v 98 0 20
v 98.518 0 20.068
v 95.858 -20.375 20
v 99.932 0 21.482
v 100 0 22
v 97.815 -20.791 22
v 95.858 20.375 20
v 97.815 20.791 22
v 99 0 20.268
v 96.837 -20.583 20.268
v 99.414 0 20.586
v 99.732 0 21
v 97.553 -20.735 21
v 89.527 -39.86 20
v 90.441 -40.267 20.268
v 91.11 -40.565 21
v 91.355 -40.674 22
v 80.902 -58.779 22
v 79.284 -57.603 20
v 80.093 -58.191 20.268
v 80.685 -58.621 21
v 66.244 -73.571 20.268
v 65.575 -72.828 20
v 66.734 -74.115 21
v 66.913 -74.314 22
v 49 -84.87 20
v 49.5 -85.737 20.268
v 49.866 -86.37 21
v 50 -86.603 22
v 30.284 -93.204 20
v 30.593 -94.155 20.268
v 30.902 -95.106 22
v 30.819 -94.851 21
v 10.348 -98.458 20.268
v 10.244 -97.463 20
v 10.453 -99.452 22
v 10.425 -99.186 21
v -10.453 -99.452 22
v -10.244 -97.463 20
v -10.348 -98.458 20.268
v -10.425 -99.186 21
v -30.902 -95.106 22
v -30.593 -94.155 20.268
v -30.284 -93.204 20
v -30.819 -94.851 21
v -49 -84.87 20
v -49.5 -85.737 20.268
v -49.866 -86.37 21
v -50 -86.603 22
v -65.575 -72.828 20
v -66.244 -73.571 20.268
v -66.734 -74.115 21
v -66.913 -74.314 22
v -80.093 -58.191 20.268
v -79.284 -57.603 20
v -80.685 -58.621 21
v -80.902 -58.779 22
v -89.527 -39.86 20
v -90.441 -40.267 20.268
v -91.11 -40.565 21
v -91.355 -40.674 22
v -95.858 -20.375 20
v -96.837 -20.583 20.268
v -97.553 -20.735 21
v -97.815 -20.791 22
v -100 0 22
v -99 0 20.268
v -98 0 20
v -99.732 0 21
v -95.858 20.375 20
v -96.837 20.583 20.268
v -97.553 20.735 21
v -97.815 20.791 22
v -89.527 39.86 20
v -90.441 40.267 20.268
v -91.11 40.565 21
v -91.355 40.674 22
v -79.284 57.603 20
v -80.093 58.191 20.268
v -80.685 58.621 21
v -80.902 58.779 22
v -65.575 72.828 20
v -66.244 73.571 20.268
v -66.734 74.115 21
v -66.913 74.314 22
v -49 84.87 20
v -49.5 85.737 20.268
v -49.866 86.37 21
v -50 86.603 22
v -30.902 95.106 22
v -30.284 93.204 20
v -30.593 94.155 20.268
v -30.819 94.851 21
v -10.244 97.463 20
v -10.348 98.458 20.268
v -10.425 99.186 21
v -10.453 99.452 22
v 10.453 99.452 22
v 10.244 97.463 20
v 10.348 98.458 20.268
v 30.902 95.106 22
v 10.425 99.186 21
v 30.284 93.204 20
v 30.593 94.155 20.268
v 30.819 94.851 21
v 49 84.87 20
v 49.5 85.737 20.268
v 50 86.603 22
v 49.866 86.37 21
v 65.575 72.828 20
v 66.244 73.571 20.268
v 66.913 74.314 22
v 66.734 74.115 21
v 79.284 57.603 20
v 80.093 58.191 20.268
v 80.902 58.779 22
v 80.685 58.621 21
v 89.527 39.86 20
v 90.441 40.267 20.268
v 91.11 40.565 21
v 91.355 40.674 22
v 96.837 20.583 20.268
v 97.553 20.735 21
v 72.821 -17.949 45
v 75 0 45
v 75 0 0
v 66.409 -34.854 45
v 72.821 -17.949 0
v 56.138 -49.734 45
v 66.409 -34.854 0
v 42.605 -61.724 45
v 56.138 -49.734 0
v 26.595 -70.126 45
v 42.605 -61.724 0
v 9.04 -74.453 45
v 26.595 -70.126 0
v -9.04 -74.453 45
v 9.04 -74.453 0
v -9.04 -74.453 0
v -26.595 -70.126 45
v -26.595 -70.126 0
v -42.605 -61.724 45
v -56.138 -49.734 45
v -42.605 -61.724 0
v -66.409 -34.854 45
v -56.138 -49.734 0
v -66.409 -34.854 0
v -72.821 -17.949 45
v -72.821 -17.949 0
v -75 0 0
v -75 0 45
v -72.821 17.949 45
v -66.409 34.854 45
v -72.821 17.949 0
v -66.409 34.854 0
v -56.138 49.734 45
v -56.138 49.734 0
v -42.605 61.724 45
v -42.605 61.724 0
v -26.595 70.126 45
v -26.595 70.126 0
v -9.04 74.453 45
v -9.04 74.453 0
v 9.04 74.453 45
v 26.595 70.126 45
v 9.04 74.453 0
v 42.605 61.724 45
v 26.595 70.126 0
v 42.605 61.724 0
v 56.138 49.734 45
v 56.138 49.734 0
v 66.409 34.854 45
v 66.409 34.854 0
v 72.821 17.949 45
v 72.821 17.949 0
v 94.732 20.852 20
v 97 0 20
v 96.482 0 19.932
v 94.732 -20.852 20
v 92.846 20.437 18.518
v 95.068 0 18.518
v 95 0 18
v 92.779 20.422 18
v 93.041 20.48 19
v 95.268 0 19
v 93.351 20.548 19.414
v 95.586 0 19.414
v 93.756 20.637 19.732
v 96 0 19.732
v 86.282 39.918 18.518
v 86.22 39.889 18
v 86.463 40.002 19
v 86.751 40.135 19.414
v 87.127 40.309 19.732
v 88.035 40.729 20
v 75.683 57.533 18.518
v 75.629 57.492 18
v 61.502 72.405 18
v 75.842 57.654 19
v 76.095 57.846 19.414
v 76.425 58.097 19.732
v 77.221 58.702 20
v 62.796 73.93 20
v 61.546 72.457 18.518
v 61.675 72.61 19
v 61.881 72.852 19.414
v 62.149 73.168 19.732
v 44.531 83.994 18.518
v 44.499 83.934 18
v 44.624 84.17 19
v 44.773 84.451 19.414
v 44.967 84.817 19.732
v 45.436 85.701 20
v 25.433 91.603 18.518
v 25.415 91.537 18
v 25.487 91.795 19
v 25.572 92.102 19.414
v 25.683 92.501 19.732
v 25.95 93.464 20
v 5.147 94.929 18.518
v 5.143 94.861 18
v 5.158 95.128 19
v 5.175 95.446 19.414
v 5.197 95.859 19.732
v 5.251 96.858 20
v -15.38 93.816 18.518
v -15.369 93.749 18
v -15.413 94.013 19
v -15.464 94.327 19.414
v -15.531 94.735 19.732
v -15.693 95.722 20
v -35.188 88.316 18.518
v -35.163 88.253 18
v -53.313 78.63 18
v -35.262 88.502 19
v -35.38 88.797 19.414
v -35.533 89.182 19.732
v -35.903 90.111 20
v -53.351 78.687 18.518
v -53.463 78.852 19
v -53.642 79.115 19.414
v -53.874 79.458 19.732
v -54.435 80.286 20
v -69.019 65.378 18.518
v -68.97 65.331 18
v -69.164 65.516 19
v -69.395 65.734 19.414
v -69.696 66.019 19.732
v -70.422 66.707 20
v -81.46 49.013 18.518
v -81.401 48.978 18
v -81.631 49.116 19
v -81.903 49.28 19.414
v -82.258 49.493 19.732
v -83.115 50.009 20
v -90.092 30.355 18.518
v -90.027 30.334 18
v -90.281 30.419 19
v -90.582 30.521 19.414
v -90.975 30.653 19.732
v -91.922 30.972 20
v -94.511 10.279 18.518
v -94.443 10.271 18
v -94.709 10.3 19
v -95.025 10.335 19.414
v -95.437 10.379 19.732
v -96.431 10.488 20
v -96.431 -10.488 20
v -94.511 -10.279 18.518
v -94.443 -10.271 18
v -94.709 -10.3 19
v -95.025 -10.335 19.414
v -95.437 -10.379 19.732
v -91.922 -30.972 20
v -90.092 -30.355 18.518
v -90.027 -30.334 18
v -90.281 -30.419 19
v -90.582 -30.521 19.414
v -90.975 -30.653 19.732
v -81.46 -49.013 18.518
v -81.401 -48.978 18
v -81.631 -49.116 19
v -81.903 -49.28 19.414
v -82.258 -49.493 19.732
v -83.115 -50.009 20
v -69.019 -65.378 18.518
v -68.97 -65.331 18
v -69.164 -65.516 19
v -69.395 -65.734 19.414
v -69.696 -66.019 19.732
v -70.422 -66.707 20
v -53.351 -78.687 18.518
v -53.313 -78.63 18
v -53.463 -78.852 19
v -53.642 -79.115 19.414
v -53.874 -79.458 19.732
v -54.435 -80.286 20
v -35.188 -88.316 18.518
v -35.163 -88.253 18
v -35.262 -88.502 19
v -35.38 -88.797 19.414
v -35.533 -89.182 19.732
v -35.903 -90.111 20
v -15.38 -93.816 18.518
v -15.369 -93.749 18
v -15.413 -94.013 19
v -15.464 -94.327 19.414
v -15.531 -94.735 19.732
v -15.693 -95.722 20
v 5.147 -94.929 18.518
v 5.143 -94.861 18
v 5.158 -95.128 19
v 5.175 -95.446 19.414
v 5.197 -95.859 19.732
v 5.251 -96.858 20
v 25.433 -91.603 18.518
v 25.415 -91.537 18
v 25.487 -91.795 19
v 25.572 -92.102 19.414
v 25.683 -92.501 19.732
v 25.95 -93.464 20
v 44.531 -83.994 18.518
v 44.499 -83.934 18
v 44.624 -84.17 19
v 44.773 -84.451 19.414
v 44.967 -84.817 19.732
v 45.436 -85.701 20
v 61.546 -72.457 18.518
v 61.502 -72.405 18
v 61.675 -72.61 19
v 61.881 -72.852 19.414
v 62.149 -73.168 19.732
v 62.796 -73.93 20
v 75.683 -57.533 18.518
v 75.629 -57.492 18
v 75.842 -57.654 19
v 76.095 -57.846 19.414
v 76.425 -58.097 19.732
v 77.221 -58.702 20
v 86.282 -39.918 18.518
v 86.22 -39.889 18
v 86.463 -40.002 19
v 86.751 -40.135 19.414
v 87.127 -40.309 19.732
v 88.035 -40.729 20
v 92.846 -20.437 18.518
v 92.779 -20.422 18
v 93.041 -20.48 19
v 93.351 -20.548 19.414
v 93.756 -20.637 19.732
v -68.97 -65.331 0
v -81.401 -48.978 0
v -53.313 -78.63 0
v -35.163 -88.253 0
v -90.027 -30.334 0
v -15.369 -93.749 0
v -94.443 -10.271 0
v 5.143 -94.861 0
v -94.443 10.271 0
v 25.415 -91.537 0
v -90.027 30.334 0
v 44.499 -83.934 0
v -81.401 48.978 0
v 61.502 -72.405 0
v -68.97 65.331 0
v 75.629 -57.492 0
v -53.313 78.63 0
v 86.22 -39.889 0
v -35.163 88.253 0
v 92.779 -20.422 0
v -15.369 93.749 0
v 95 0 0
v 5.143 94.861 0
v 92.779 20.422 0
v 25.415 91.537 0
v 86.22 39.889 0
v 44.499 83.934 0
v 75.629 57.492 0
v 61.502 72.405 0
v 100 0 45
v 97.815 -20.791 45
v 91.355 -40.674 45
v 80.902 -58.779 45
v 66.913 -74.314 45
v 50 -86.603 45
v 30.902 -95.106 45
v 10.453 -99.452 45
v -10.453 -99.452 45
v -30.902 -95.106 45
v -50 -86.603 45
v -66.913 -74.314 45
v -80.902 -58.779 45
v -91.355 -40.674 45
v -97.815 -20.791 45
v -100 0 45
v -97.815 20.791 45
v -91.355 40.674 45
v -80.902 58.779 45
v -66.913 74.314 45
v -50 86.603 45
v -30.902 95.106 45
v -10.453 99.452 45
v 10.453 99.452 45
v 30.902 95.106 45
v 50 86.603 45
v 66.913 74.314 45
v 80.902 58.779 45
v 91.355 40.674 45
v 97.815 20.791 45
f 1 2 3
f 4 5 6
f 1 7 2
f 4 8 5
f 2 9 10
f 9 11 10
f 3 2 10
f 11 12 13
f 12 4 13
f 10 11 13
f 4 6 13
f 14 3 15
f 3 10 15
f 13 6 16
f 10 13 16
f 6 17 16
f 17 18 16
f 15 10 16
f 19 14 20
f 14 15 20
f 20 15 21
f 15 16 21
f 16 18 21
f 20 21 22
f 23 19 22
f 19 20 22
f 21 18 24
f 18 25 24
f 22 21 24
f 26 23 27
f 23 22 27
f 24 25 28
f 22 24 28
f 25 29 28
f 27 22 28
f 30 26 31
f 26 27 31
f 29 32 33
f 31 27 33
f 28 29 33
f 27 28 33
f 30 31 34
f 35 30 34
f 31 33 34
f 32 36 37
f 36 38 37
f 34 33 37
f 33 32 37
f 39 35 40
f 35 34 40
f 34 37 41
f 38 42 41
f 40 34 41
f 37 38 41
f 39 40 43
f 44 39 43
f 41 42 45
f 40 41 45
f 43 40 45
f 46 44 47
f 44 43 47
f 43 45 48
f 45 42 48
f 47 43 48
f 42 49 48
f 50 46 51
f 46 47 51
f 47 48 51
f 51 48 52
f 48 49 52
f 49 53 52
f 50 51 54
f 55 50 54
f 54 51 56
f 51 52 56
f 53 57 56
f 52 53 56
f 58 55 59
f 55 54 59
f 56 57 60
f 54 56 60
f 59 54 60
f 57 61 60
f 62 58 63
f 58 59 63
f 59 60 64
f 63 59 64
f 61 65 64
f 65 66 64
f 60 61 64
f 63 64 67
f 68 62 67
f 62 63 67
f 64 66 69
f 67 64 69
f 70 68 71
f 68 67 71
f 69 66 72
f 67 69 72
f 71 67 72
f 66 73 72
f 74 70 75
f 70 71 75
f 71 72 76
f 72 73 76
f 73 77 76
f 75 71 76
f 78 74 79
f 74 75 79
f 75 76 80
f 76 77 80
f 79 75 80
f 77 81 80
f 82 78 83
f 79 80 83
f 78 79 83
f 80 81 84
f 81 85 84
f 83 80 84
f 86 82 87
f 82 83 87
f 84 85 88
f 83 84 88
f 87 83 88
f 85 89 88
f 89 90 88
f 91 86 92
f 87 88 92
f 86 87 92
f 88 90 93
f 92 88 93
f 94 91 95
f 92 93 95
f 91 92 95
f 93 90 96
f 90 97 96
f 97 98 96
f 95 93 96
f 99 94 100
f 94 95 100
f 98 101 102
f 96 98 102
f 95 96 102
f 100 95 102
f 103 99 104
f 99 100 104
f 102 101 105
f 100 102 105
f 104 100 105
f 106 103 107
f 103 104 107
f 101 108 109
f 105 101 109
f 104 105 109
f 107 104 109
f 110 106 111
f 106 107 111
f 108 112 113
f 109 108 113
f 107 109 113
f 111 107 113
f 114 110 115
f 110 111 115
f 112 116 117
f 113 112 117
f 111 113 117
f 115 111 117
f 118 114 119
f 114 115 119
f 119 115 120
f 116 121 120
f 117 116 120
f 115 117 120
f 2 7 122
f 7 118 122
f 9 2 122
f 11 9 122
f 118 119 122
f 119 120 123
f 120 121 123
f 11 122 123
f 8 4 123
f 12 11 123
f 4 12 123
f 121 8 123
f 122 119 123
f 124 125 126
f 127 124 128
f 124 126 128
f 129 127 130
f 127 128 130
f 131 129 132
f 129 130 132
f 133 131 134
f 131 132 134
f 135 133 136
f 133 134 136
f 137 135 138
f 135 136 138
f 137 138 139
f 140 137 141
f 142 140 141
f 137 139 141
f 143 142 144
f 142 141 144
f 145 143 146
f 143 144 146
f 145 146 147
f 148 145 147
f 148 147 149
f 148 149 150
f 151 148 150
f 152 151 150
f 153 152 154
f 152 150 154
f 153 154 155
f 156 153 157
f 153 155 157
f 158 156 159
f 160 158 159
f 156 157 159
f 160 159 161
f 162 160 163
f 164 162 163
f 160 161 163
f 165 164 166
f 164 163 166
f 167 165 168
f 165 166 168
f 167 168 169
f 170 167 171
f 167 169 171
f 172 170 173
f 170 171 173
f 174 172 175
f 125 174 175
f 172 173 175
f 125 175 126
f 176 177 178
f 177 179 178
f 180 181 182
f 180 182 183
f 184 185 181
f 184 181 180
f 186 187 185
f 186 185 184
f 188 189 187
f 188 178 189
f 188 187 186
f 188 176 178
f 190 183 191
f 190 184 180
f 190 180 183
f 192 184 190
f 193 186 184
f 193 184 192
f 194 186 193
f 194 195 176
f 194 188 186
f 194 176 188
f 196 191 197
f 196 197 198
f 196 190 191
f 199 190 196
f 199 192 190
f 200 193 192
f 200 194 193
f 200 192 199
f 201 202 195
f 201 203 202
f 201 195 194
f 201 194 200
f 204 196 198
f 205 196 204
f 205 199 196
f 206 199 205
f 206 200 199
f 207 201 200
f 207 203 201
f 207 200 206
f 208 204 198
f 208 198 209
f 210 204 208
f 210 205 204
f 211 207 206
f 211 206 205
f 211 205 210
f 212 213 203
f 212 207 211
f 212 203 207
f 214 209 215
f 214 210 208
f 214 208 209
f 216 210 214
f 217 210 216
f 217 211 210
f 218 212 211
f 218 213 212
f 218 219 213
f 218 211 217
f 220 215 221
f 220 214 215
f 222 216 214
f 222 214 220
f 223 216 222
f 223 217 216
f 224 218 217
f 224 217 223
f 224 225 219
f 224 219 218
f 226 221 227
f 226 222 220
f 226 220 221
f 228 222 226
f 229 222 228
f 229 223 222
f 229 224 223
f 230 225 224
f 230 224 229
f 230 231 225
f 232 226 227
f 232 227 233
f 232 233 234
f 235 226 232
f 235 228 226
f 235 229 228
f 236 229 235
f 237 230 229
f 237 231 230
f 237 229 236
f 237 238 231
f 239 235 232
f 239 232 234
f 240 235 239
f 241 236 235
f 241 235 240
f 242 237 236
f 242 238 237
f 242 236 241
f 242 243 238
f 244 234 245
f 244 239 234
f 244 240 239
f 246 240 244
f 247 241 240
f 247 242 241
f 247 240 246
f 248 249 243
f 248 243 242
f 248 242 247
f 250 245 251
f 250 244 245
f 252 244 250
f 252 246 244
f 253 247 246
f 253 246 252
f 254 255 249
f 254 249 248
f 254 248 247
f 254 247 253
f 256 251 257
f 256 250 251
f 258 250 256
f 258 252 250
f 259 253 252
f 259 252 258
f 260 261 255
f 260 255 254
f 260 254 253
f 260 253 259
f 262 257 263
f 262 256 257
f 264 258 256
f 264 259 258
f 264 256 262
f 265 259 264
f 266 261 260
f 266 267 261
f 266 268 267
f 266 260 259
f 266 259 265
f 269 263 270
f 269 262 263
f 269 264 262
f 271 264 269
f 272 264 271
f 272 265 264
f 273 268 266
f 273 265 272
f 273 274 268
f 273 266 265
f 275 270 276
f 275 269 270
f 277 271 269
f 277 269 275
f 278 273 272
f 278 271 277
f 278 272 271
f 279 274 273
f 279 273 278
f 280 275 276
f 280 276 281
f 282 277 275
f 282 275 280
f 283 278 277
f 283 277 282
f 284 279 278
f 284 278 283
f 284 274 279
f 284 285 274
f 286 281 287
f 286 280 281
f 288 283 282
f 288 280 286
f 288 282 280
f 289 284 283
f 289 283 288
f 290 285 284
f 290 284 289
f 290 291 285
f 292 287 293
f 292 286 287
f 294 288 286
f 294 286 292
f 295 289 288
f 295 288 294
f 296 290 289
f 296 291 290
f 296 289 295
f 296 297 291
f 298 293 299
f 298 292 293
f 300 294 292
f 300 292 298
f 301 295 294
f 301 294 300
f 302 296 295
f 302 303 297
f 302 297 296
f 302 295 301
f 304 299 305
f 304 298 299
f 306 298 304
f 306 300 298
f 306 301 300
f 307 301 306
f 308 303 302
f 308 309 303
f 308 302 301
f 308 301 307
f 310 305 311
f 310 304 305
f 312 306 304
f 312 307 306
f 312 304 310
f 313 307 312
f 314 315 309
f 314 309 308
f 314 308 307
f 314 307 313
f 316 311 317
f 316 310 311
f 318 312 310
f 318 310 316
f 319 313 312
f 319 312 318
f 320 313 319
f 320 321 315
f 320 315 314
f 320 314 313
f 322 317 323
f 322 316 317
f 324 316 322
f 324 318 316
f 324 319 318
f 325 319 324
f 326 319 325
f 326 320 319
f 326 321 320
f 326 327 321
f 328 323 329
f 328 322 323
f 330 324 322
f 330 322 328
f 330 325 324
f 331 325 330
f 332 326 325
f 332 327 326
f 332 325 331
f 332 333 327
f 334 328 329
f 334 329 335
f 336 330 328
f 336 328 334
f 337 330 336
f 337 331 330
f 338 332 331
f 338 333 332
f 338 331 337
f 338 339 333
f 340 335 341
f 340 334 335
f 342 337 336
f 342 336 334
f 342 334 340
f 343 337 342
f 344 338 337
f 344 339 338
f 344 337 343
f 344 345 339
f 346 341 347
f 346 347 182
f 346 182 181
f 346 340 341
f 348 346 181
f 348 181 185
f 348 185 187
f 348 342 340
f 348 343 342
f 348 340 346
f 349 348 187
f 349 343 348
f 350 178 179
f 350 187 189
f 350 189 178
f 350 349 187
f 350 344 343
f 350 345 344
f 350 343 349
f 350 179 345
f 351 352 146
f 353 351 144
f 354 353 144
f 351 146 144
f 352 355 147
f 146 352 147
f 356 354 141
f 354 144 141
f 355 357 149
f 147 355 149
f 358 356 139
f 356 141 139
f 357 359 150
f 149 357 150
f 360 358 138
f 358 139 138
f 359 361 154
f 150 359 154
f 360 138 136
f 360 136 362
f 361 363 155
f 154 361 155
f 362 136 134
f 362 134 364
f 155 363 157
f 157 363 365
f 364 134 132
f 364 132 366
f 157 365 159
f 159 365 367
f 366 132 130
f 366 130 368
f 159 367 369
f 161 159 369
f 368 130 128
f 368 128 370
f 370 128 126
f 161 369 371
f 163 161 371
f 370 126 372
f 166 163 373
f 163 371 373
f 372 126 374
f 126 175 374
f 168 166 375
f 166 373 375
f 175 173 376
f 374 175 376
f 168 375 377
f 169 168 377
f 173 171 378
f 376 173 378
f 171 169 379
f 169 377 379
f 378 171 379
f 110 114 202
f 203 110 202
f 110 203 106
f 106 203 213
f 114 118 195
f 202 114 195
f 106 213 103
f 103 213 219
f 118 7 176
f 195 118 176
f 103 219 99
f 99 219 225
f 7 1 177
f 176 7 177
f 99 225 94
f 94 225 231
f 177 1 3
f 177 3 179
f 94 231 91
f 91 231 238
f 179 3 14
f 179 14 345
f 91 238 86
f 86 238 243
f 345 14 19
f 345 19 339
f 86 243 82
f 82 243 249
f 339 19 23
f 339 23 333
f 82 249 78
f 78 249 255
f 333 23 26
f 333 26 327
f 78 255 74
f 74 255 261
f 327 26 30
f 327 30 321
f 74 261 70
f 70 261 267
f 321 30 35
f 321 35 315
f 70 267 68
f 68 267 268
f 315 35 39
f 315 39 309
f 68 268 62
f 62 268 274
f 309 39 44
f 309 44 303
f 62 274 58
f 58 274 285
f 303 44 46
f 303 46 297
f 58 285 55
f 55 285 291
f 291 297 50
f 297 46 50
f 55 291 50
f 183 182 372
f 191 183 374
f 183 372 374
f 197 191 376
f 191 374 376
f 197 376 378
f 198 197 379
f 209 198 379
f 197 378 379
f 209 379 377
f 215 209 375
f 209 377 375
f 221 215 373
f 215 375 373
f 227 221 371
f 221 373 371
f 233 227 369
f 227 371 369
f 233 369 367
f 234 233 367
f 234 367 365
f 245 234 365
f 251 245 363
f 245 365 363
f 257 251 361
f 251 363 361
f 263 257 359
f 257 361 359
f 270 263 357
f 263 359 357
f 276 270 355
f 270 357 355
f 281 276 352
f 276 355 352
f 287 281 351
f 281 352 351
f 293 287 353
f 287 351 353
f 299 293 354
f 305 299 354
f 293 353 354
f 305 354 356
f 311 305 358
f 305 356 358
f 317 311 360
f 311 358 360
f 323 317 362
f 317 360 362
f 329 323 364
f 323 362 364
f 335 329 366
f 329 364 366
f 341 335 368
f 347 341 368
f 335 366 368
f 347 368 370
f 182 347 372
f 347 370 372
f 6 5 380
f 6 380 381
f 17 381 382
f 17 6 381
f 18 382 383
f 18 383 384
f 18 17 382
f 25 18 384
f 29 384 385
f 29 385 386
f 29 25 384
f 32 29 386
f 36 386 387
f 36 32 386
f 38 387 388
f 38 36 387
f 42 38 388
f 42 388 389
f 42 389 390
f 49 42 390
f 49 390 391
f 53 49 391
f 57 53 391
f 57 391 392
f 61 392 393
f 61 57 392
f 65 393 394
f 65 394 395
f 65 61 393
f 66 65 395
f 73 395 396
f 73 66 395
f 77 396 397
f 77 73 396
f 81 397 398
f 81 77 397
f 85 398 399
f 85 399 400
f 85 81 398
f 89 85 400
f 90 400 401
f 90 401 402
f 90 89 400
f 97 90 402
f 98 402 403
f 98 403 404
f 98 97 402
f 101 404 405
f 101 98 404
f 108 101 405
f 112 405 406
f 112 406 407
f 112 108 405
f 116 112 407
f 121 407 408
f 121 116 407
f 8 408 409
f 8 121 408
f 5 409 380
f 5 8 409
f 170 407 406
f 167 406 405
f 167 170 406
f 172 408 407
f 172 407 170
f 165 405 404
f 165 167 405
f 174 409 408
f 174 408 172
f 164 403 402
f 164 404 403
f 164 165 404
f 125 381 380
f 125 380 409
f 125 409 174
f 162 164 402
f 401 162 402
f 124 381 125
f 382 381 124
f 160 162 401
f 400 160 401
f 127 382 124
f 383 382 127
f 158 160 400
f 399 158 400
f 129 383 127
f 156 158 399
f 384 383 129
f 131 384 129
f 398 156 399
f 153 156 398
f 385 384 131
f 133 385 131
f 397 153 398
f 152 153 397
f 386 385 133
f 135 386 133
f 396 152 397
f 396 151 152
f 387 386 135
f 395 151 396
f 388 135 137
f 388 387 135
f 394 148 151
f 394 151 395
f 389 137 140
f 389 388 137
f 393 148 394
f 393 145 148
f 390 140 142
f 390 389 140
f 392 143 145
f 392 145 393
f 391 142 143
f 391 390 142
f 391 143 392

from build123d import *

# Parameters (mm, degrees)
SKIZZE2_R                       = 95
SKIZZE2_R_2                     = 75
AUFSATZ_LINEAR_AUSTRAGEN1_DEPTH = 20
SKIZZE3_W                       = 25
SKIZZE3_H                       = 25
VERRUNDUNG3_R                   = 2


with BuildPart() as part:
    # Skizze2 → Aufsatz-Linear austragen1 (new body)
    with BuildSketch(Plane.XY):
        Circle(SKIZZE2_R)
        Circle(SKIZZE2_R_2, mode=Mode.SUBTRACT)
    extrude(amount=AUFSATZ_LINEAR_AUSTRAGEN1_DEPTH)

    # Skizze3 → Rotation1 (revolve)
    with BuildSketch(Plane(origin=(0, 0, 0), x_dir=(1, 0, 0), z_dir=(0, 1, 0))):
        with Locations((87.5, -32.5)):
            Rectangle(SKIZZE3_W, SKIZZE3_H)
    revolve(axis=Axis((0, 0, 20), (0, 0, -1)))

    # Verrundung3
    verrundung3_edges = [part.edges().sort_by_distance(p)[0] for p in [
        (-100, 0, 20),
        (-95, 0, 20),
    ]]
    fillet(verrundung3_edges, radius=VERRUNDUNG3_R)


solid = part.part
